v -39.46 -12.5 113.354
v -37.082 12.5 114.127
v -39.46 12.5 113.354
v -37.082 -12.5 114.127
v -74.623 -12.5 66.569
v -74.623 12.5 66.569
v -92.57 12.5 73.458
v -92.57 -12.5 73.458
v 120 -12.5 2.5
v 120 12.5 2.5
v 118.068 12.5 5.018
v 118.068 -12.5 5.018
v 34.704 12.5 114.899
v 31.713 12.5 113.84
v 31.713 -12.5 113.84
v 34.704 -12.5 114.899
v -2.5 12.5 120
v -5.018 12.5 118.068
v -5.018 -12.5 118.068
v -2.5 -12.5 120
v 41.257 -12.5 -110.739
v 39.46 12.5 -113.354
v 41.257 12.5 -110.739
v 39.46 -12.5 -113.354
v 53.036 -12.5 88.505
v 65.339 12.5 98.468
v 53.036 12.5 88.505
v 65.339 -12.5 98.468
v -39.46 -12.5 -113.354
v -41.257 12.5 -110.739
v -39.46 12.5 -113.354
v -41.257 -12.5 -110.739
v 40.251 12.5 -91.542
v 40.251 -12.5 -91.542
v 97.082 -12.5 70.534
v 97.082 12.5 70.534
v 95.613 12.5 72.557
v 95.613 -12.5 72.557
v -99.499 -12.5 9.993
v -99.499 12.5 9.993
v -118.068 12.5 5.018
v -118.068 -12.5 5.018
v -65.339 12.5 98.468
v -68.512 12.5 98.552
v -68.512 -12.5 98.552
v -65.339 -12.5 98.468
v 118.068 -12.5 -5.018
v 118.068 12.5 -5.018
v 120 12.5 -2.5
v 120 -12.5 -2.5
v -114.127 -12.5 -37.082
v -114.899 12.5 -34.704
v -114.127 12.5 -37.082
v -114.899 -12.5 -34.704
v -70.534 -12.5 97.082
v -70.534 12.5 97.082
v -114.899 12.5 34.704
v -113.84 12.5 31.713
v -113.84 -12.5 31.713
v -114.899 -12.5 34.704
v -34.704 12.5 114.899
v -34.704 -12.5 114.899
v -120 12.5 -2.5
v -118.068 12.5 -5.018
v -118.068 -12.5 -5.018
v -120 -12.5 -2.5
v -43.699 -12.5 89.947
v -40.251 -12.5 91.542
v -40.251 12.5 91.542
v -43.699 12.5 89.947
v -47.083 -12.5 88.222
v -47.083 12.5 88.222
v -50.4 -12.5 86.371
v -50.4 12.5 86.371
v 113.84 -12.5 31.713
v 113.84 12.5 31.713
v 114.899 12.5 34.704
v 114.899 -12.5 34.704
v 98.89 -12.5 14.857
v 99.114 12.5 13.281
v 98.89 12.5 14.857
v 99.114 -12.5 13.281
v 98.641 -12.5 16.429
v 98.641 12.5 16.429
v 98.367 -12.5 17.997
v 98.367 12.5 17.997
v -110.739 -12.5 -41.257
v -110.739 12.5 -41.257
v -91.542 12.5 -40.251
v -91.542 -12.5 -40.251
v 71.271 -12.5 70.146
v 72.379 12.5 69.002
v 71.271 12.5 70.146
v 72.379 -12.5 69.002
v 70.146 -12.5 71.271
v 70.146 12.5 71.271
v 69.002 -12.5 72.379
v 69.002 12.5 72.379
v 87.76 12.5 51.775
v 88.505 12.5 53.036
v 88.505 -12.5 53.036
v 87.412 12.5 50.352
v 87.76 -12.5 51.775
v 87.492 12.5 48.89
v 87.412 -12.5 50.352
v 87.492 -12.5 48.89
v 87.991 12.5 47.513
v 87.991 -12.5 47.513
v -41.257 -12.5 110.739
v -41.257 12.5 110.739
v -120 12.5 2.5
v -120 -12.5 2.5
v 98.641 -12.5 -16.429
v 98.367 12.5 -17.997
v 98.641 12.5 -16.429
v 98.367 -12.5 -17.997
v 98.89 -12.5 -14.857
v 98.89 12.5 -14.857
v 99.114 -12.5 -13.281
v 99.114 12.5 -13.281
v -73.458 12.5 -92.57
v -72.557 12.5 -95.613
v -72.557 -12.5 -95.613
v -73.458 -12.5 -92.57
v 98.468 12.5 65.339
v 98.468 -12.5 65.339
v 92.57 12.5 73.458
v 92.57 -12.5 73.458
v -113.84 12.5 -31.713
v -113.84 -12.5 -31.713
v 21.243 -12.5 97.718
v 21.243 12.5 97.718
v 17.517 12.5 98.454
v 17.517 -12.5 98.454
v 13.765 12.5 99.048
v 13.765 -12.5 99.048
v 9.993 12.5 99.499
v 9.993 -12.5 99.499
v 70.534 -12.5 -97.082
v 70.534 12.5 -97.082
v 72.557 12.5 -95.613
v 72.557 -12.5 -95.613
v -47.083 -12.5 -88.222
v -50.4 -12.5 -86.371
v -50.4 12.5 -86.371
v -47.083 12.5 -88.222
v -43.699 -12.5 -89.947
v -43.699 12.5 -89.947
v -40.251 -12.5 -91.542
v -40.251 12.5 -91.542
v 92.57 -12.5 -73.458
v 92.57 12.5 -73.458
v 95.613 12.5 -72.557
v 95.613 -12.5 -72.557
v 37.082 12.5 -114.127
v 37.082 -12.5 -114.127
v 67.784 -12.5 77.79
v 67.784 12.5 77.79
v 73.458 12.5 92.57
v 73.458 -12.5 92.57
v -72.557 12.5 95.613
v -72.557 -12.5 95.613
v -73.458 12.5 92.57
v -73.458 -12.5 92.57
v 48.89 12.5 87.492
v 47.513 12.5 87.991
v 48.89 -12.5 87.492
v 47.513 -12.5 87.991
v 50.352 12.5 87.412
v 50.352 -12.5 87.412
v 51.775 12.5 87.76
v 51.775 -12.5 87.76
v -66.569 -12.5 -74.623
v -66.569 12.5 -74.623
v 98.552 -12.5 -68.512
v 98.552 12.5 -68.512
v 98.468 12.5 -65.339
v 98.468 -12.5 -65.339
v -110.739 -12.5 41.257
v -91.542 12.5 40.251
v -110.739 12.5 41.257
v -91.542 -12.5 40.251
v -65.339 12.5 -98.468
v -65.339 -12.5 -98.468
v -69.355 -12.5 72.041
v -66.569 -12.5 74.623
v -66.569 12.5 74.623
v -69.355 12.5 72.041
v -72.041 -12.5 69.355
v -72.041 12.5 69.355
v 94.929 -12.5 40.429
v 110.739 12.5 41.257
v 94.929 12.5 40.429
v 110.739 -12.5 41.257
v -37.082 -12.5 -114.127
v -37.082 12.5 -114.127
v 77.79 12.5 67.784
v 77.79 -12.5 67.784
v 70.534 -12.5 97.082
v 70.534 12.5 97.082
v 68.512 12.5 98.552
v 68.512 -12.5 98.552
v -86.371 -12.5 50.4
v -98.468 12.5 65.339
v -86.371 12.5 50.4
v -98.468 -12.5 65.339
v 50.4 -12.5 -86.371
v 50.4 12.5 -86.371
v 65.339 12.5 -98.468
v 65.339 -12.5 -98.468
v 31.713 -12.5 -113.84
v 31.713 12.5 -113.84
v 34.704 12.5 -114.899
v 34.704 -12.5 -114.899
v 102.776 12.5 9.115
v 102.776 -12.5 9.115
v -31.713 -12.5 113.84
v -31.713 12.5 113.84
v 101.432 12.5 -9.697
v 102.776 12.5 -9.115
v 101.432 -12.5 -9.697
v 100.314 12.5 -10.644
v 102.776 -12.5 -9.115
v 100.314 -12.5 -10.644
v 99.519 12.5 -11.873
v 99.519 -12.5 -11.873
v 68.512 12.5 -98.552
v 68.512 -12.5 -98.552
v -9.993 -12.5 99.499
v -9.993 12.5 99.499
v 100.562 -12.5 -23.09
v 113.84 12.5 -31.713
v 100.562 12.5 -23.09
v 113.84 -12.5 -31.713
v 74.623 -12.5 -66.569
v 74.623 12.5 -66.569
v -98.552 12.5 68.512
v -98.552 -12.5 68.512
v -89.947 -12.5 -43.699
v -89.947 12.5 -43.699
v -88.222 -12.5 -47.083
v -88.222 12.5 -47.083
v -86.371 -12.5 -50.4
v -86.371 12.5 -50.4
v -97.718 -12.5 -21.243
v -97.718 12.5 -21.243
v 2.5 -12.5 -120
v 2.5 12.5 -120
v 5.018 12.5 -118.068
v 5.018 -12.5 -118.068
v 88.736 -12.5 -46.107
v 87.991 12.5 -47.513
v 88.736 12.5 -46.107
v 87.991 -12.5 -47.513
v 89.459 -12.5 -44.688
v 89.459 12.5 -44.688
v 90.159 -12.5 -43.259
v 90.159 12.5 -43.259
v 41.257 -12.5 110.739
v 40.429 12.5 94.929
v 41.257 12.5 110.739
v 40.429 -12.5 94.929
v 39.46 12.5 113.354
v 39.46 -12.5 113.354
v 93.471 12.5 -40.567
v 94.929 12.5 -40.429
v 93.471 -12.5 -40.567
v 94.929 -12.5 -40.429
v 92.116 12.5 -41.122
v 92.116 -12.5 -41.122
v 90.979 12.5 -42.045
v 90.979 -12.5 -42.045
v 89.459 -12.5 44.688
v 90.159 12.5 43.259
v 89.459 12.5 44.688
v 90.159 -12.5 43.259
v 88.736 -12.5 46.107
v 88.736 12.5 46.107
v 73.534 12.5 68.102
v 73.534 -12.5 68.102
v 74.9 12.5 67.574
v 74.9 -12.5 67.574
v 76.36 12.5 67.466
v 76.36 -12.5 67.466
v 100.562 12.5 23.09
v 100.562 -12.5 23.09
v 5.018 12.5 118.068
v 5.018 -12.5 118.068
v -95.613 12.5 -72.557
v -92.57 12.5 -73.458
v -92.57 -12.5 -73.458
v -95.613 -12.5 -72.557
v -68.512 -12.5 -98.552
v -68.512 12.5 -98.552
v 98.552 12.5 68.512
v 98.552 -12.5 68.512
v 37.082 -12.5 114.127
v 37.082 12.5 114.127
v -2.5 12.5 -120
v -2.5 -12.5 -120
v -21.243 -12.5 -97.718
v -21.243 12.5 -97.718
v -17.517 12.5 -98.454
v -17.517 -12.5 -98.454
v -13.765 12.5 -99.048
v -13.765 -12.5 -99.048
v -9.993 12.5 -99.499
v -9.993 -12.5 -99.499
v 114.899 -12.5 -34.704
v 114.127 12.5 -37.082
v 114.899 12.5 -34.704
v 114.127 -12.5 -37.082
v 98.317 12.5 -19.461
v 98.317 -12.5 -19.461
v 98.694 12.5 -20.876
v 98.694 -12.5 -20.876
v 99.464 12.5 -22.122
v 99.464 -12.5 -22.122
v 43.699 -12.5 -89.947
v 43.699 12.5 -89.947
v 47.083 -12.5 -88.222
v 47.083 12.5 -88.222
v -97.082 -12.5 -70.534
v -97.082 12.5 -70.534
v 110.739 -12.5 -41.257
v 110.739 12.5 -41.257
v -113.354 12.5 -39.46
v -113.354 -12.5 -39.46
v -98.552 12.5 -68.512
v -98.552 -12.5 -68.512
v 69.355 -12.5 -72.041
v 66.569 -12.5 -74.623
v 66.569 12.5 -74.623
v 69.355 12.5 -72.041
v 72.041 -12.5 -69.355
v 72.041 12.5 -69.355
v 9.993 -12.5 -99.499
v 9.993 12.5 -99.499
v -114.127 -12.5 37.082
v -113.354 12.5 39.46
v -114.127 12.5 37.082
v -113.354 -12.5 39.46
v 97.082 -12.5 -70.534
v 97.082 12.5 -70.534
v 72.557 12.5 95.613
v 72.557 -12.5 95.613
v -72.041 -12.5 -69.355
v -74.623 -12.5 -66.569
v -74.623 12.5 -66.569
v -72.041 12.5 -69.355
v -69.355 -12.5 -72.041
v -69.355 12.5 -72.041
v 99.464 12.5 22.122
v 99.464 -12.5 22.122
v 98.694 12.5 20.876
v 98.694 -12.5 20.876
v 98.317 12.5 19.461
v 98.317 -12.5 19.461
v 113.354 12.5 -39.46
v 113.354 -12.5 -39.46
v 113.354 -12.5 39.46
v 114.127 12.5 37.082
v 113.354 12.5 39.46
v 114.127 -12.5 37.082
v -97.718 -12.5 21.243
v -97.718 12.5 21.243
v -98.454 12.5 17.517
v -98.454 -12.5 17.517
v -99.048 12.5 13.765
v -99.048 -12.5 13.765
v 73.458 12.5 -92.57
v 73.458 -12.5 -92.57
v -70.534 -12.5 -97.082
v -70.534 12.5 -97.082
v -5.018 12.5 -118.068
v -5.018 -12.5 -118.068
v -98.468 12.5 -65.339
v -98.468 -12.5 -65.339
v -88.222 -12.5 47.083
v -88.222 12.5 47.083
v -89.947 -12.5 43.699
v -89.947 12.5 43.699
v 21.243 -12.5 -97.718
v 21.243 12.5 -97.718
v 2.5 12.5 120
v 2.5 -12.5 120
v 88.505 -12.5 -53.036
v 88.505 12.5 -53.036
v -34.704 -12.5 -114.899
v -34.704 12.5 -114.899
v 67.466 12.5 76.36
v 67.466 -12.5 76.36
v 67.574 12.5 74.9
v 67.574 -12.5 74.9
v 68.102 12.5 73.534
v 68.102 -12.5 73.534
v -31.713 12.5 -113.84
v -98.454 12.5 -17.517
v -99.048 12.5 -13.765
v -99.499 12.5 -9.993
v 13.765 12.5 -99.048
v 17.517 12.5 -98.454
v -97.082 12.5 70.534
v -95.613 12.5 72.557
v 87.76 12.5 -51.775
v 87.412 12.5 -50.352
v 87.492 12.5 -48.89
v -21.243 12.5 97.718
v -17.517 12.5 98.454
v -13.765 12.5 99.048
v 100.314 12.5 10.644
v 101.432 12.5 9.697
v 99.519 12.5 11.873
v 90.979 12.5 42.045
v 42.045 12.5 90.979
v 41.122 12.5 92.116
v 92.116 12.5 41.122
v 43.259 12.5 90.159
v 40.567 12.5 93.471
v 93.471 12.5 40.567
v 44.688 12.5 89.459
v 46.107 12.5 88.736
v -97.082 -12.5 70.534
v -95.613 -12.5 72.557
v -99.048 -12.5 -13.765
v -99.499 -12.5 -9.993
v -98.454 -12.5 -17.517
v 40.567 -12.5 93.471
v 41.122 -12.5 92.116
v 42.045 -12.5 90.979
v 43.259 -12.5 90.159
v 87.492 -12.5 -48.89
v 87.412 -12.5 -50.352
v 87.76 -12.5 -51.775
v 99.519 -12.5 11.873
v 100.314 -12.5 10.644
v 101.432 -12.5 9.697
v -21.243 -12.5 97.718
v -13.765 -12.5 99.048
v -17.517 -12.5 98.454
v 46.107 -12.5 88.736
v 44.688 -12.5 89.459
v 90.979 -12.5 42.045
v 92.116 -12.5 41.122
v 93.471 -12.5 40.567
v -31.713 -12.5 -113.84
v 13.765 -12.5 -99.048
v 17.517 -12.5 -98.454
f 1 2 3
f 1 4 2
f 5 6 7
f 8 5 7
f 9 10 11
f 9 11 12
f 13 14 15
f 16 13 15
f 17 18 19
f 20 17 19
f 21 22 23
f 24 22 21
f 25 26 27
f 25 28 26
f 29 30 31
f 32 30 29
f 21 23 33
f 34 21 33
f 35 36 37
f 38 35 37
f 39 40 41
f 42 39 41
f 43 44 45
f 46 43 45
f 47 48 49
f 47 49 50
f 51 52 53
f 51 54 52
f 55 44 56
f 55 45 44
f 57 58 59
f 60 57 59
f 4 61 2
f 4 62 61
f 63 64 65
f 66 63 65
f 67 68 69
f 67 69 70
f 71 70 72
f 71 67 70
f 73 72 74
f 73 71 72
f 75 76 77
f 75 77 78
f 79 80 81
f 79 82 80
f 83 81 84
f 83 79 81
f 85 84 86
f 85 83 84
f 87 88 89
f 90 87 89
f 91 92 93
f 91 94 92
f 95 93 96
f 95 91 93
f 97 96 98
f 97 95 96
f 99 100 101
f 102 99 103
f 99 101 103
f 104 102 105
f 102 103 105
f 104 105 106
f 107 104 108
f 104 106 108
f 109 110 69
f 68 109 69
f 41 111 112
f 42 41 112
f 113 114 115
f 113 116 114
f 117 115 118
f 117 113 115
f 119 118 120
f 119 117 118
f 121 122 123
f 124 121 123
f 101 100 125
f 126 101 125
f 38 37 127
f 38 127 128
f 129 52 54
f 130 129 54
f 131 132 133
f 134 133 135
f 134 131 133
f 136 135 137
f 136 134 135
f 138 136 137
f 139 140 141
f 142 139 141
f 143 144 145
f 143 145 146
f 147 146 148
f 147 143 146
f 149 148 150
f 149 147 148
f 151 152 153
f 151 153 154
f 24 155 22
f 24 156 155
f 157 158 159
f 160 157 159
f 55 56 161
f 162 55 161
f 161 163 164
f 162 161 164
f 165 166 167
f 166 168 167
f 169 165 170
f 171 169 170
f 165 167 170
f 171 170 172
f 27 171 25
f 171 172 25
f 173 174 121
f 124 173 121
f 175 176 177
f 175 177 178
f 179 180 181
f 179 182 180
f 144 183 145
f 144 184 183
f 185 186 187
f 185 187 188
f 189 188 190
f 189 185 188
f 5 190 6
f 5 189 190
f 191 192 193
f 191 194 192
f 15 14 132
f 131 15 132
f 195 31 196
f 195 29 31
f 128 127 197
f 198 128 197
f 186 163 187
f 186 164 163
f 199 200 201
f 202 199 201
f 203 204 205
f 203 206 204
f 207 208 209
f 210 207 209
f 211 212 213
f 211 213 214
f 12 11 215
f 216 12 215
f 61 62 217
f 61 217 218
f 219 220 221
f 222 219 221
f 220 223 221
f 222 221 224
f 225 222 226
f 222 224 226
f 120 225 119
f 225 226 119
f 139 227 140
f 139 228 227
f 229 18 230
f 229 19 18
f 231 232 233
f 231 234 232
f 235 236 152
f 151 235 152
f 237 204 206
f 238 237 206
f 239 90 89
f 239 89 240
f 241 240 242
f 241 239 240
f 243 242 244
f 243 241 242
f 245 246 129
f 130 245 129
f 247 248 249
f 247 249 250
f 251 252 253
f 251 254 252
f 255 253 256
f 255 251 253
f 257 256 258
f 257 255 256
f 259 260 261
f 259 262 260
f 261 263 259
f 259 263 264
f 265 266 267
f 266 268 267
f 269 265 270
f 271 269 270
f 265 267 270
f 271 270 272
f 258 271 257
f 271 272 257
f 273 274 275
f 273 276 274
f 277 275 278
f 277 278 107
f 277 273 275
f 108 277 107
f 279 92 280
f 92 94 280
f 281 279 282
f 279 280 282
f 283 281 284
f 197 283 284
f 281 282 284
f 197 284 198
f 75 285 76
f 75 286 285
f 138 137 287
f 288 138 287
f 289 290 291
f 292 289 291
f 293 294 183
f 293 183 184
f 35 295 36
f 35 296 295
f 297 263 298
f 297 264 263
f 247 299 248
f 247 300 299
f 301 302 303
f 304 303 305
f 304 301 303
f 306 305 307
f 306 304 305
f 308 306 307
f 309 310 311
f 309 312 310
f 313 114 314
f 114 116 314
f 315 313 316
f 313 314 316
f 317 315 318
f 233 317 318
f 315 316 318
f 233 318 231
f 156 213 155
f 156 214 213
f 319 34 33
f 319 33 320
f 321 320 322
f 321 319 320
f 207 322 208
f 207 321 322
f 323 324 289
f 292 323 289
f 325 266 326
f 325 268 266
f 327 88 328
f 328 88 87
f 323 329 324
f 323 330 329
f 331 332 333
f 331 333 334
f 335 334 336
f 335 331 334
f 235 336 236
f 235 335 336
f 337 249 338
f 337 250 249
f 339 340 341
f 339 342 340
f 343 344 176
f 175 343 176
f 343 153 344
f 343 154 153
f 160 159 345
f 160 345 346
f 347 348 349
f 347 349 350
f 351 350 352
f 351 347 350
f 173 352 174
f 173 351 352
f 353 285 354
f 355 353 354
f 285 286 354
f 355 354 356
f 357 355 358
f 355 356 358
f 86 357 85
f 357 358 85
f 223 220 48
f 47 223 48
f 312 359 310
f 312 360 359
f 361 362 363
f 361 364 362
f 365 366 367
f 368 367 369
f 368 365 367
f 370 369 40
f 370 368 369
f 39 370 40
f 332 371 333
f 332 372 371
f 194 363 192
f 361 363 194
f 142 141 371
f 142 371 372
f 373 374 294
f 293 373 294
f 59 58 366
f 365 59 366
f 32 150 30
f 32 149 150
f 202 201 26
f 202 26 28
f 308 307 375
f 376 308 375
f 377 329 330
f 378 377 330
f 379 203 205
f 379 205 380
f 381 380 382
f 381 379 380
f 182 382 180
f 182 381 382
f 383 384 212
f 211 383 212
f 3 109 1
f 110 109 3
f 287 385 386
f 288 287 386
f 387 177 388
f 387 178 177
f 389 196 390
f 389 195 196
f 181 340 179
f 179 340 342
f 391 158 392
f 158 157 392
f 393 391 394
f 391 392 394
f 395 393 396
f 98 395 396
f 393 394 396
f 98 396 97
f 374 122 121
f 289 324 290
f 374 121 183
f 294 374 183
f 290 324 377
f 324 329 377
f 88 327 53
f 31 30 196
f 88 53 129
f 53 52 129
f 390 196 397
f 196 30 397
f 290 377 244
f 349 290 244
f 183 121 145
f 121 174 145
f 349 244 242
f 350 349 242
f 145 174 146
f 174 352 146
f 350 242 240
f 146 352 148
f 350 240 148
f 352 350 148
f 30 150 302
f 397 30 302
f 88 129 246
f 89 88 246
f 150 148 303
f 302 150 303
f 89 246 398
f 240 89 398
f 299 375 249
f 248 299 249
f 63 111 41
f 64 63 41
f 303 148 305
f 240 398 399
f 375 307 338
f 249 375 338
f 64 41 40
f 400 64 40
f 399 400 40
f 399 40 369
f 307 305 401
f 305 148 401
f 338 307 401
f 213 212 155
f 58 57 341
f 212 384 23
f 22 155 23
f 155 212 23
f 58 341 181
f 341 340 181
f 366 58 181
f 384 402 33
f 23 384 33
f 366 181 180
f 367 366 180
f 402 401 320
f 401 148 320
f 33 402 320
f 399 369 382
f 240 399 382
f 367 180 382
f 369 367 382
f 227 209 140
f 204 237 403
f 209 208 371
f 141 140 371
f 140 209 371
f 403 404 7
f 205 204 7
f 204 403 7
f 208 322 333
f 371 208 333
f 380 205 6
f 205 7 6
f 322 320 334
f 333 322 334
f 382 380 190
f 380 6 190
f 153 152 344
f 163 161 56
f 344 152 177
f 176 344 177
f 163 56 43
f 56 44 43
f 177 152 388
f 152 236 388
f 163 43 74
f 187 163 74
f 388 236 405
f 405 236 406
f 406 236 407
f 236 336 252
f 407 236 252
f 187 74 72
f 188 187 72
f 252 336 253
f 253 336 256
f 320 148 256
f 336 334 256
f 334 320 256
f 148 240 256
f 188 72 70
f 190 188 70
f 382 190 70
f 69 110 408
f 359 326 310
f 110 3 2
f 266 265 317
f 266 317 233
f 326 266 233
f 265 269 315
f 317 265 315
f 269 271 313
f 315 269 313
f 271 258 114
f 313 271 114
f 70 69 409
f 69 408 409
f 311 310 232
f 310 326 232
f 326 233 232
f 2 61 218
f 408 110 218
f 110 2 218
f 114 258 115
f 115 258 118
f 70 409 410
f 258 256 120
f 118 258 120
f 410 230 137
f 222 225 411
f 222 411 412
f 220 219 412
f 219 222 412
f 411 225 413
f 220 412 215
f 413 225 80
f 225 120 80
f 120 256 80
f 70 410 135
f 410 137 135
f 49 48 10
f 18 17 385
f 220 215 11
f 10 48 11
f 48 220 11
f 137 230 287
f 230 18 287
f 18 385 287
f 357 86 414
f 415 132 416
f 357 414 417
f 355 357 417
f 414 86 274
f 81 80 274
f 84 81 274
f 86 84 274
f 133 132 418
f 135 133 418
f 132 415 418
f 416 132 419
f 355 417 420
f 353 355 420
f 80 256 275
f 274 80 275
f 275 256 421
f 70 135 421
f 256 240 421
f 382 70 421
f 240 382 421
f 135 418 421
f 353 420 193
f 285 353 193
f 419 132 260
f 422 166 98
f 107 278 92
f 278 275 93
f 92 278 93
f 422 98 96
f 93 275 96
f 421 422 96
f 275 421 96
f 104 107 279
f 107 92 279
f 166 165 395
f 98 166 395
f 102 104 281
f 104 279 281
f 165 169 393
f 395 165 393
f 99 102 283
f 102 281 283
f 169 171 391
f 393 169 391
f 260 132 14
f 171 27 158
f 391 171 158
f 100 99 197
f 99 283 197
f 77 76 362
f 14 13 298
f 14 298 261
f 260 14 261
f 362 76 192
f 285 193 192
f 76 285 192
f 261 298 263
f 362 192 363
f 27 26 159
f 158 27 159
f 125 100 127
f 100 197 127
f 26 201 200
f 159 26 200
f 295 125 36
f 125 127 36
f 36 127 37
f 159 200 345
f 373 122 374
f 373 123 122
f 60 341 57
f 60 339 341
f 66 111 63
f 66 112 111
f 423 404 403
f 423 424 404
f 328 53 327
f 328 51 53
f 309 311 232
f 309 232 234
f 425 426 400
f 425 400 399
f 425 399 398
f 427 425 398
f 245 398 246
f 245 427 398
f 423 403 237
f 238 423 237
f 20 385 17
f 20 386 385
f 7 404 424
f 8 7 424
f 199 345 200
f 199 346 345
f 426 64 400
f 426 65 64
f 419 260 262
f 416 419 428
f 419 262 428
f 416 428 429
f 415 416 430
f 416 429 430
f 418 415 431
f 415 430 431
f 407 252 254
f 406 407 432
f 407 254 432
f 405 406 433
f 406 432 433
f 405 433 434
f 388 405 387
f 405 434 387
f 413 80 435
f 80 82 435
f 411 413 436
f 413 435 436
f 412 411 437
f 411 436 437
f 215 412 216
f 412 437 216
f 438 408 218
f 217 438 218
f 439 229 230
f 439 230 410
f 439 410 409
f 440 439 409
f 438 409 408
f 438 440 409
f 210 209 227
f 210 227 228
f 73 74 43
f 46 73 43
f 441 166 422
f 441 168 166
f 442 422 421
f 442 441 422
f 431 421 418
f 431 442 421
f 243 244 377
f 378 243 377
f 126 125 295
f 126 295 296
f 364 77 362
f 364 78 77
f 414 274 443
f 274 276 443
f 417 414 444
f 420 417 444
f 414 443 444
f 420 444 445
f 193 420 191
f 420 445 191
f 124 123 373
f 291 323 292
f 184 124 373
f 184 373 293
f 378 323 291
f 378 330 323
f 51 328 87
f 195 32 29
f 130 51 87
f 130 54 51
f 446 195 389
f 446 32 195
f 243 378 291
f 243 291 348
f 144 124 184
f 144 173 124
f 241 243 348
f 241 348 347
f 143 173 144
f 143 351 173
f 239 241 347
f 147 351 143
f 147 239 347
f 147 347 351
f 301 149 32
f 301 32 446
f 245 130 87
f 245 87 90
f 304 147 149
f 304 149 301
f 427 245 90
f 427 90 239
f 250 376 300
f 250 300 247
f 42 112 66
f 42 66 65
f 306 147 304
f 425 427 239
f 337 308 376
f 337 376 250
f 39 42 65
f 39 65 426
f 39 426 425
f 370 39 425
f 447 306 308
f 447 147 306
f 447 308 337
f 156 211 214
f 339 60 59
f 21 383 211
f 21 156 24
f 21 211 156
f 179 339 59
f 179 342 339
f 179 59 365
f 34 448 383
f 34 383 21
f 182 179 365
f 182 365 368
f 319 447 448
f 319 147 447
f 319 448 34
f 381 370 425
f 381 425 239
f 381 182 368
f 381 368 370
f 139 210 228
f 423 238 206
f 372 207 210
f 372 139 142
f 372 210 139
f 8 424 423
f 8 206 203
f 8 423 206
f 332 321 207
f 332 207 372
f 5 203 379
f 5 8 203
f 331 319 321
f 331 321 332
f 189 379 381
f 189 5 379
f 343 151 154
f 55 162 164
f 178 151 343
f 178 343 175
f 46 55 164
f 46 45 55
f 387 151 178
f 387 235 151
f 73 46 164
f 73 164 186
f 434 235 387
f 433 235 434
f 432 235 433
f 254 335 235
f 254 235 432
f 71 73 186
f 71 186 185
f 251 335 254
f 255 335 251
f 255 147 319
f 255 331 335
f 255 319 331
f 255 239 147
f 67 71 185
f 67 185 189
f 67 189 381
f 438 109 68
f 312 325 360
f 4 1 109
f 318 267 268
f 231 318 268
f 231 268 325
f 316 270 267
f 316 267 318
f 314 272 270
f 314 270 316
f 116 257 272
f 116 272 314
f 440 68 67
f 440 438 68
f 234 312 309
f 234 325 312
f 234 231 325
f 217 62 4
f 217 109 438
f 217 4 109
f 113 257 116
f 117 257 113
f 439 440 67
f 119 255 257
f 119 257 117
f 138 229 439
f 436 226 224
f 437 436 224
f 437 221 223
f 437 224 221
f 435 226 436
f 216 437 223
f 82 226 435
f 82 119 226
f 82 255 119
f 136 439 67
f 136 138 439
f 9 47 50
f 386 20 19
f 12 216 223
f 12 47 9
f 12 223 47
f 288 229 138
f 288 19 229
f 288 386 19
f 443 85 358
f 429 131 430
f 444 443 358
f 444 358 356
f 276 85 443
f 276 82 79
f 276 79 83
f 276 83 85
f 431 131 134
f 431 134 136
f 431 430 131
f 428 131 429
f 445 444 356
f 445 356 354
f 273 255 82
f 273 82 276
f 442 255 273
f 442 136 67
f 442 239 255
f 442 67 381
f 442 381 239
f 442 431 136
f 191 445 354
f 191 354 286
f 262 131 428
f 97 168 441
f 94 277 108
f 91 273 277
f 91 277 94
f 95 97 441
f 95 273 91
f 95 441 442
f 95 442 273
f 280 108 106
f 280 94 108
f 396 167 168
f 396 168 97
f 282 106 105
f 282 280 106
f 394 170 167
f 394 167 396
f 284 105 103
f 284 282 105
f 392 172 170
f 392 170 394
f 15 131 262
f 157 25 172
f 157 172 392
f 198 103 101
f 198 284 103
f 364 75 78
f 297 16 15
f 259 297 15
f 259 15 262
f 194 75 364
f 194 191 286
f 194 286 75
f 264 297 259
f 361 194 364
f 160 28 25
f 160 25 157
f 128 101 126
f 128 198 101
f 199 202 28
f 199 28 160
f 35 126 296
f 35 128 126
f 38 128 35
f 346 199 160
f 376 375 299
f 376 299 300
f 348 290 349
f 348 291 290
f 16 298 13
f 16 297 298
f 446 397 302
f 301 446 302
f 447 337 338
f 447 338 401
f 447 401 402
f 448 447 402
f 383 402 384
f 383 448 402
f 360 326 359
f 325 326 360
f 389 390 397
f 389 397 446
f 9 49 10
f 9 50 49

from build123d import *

# Parameters (mm, degrees)
F1_DEPTH = 12.5
F2_R     = 5
F3_SIZE  = 2
F4_R     = 5


with BuildPart() as f1:
    # F0 (on Front) → F1 (new body, symmetric)
    with BuildSketch(Plane.XZ):
        with BuildLine():
            Line((-41.361794, 112.736205), (-40.251029, 91.541546))
            ThreePointArc((-40.251029, 91.541546), (-45.39905, 89.100652), (-50.399706, 86.370537))
            Line((-50.399706, 86.370537), (-66.893654, 99.727073))
            Line((-66.893654, 99.727073), (-70.53423, 97.082039))
            Line((-70.53423, 97.082039), (-74.174807, 94.437006))
            Line((-74.174807, 94.437006), (-66.568897, 74.622932))
            ThreePointArc((-66.568897, 74.622932), (-70.710678, 70.710678), (-74.622932, 66.568897))
            Line((-74.622932, 66.568897), (-94.437006, 74.174807))
            Line((-94.437006, 74.174807), (-97.082039, 70.53423))
            Line((-97.082039, 70.53423), (-99.727073, 66.893654))
            Line((-99.727073, 66.893654), (-86.370537, 50.399706))
            ThreePointArc((-86.370537, 50.399706), (-89.100652, 45.39905), (-91.541546, 40.251029))
            Line((-91.541546, 40.251029), (-112.736205, 41.361794))
            Line((-112.736205, 41.361794), (-114.126782, 37.082039))
            Line((-114.126782, 37.082039), (-115.517358, 32.802285))
            Line((-115.517358, 32.802285), (-97.717628, 21.243005))
            ThreePointArc((-97.717628, 21.243005), (-98.768834, 15.643447), (-99.499436, 9.99311))
            Line((-99.499436, 9.99311), (-120, 4.5))
            Line((-120, 4.5), (-120, 0))
            Line((-120, 0), (-120, -4.5))
            Line((-120, -4.5), (-99.499436, -9.99311))
            ThreePointArc((-99.499436, -9.99311), (-98.768834, -15.643447), (-97.717628, -21.243005))
            Line((-97.717628, -21.243005), (-115.517358, -32.802285))
            Line((-115.517358, -32.802285), (-114.126782, -37.082039))
            Line((-114.126782, -37.082039), (-112.736205, -41.361794))
            Line((-112.736205, -41.361794), (-91.541546, -40.251029))
            ThreePointArc((-91.541546, -40.251029), (-89.100652, -45.39905), (-86.370537, -50.399706))
            Line((-86.370537, -50.399706), (-99.727073, -66.893654))
            Line((-99.727073, -66.893654), (-97.082039, -70.53423))
            Line((-97.082039, -70.53423), (-94.437006, -74.174807))
            Line((-94.437006, -74.174807), (-74.622932, -66.568897))
            ThreePointArc((-74.622932, -66.568897), (-70.710678, -70.710678), (-66.568897, -74.622932))
            Line((-66.568897, -74.622932), (-74.174807, -94.437006))
            Line((-74.174807, -94.437006), (-70.53423, -97.082039))
            Line((-70.53423, -97.082039), (-66.893654, -99.727073))
            Line((-66.893654, -99.727073), (-50.399706, -86.370537))
            ThreePointArc((-50.399706, -86.370537), (-45.39905, -89.100652), (-40.251029, -91.541546))
            Line((-40.251029, -91.541546), (-41.361794, -112.736205))
            Line((-41.361794, -112.736205), (-37.082039, -114.126782))
            Line((-37.082039, -114.126782), (-32.802285, -115.517358))
            Line((-32.802285, -115.517358), (-21.243005, -97.717628))
            ThreePointArc((-21.243005, -97.717628), (-15.643447, -98.768834), (-9.99311, -99.499436))
            Line((-9.99311, -99.499436), (-4.5, -120))
            Line((-4.5, -120), (0, -120))
            Line((0, -120), (4.5, -120))
            Line((4.5, -120), (9.99311, -99.499436))
            ThreePointArc((9.99311, -99.499436), (15.643447, -98.768834), (21.243005, -97.717628))
            Line((21.243005, -97.717628), (32.802285, -115.517358))
            Line((32.802285, -115.517358), (37.082039, -114.126782))
            Line((37.082039, -114.126782), (41.361794, -112.736205))
            Line((41.361794, -112.736205), (40.251029, -91.541546))
            ThreePointArc((40.251029, -91.541546), (45.39905, -89.100652), (50.399706, -86.370537))
            Line((50.399706, -86.370537), (66.893654, -99.727073))
            Line((66.893654, -99.727073), (70.53423, -97.082039))
            Line((70.53423, -97.082039), (74.174807, -94.437006))
            Line((74.174807, -94.437006), (66.568897, -74.622932))
            ThreePointArc((66.568897, -74.622932), (70.710678, -70.710678), (74.622932, -66.568897))
            Line((74.622932, -66.568897), (94.437006, -74.174807))
            Line((94.437006, -74.174807), (97.082039, -70.53423))
            Line((97.082039, -70.53423), (99.727073, -66.893654))
            Line((99.727073, -66.893654), (86.370537, -50.399706))
            ThreePointArc((86.370537, -50.399706), (89.100652, -45.39905), (91.541546, -40.251029))
            Line((91.541546, -40.251029), (112.736205, -41.361794))
            Line((112.736205, -41.361794), (114.126782, -37.082039))
            Line((114.126782, -37.082039), (115.517358, -32.802285))
            Line((115.517358, -32.802285), (97.717628, -21.243005))
            ThreePointArc((97.717628, -21.243005), (98.768834, -15.643447), (99.499436, -9.99311))
            Line((99.499436, -9.99311), (120, -4.5))
            Line((120, -4.5), (120, 0))
            Line((120, 0), (120, 4.5))
            Line((120, 4.5), (99.499436, 9.99311))
            ThreePointArc((99.499436, 9.99311), (98.768834, 15.643447), (97.717628, 21.243005))
            Line((97.717628, 21.243005), (115.517358, 32.802285))
            Line((115.517358, 32.802285), (114.126782, 37.082039))
            Line((114.126782, 37.082039), (112.736205, 41.361794))
            Line((112.736205, 41.361794), (91.541546, 40.251029))
            ThreePointArc((91.541546, 40.251029), (89.100652, 45.39905), (86.370537, 50.399706))
            Line((86.370537, 50.399706), (99.727073, 66.893654))
            Line((99.727073, 66.893654), (97.082039, 70.53423))
            Line((97.082039, 70.53423), (94.437006, 74.174807))
            Line((94.437006, 74.174807), (74.622932, 66.568897))
            ThreePointArc((74.622932, 66.568897), (70.710678, 70.710678), (66.568897, 74.622932))
            Line((66.568897, 74.622932), (74.174807, 94.437006))
            Line((74.174807, 94.437006), (70.53423, 97.082039))
            Line((70.53423, 97.082039), (66.893654, 99.727073))
            Line((66.893654, 99.727073), (50.399706, 86.370537))
            ThreePointArc((50.399706, 86.370537), (45.39905, 89.100652), (40.251029, 91.541546))
            Line((40.251029, 91.541546), (41.361794, 112.736205))
            Line((41.361794, 112.736205), (37.082039, 114.126782))
            Line((37.082039, 114.126782), (32.802285, 115.517358))
            Line((32.802285, 115.517358), (21.243005, 97.717628))
            ThreePointArc((21.243005, 97.717628), (15.643447, 98.768834), (9.99311, 99.499436))
            Line((9.99311, 99.499436), (4.5, 120))
            Line((4.5, 120), (0, 120))
            Line((0, 120), (-4.5, 120))
            Line((-4.5, 120), (-9.99311, 99.499436))
            ThreePointArc((-9.99311, 99.499436), (-15.643447, 98.768834), (-21.243005, 97.717628))
            Line((-21.243005, 97.717628), (-32.802285, 115.517358))
            Line((-32.802285, 115.517358), (-37.082039, 114.126782))
            Line((-37.082039, 114.126782), (-41.361794, 112.736205))
        make_face()
    extrude(amount=F1_DEPTH, both=True)

    # F2
    f2_edges = [f1.edges().sort_by_distance(p)[0] for p in [
        (40.251029, 0, 91.541546),
        (50.399706, 0, 86.370537),
    ]]
    fillet(f2_edges, radius=F2_R)

    # F3
    f3_edges = [f1.edges().sort_by_distance(p)[0] for p in [
        (-66.893654, 0, 99.727073),
        (-74.174807, 0, 94.437006),
        (-32.802285, 0, 115.517358),
        (-41.361794, 0, 112.736205),
        (4.5, 0, 120),
        (-4.5, 0, 120),
        (41.361794, 0, 112.736205),
        (32.802285, 0, 115.517358),
        (74.174807, 0, 94.437006),
        (66.893654, 0, 99.727073),
        (99.727073, 0, 66.893654),
        (94.437006, 0, 74.174807),
        (115.517358, 0, 32.802285),
        (112.736205, 0, 41.361794),
        (120, 0, -4.5),
        (120, 0, 4.5),
        (112.736205, 0, -41.361794),
        (115.517358, 0, -32.802285),
        (94.437006, 0, -74.174807),
        (99.727073, 0, -66.893654),
        (66.893654, 0, -99.727073),
        (74.174807, 0, -94.437006),
        (32.802285, 0, -115.517358),
        (41.361794, 0, -112.736205),
        (-4.5, 0, -120),
        (4.5, 0, -120),
        (-41.361794, 0, -112.736205),
        (-32.802285, 0, -115.517358),
        (-74.174807, 0, -94.437006),
        (-66.893654, 0, -99.727073),
        (-99.727073, 0, -66.893654),
        (-94.437006, 0, -74.174807),
        (-112.736205, 0, -41.361794),
        (-115.517358, 0, -32.802285),
        (-120, 0, -4.5),
        (-120, 0, 4.5),
        (-115.517358, 0, 32.802285),
        (-112.736205, 0, 41.361794),
        (-99.727073, 0, 66.893654),
        (-94.437006, 0, 74.174807),
    ]]
    chamfer(f3_edges, length=F3_SIZE)

    # F4
    f4_edges = [f1.edges().sort_by_distance(p)[0] for p in [
        (74.622932, 0, 66.568897),
        (66.568897, 0, 74.622932),
        (91.541546, 0, 40.251029),
        (86.370537, 0, 50.399706),
        (97.717628, 0, 21.243005),
        (99.499436, 0, 9.99311),
        (99.499436, 0, -9.99311),
        (97.717628, 0, -21.243005),
        (91.541546, 0, -40.251029),
        (86.370537, 0, -50.399706),
    ]]
    fillet(f4_edges, radius=F4_R)


solid = f1.part
